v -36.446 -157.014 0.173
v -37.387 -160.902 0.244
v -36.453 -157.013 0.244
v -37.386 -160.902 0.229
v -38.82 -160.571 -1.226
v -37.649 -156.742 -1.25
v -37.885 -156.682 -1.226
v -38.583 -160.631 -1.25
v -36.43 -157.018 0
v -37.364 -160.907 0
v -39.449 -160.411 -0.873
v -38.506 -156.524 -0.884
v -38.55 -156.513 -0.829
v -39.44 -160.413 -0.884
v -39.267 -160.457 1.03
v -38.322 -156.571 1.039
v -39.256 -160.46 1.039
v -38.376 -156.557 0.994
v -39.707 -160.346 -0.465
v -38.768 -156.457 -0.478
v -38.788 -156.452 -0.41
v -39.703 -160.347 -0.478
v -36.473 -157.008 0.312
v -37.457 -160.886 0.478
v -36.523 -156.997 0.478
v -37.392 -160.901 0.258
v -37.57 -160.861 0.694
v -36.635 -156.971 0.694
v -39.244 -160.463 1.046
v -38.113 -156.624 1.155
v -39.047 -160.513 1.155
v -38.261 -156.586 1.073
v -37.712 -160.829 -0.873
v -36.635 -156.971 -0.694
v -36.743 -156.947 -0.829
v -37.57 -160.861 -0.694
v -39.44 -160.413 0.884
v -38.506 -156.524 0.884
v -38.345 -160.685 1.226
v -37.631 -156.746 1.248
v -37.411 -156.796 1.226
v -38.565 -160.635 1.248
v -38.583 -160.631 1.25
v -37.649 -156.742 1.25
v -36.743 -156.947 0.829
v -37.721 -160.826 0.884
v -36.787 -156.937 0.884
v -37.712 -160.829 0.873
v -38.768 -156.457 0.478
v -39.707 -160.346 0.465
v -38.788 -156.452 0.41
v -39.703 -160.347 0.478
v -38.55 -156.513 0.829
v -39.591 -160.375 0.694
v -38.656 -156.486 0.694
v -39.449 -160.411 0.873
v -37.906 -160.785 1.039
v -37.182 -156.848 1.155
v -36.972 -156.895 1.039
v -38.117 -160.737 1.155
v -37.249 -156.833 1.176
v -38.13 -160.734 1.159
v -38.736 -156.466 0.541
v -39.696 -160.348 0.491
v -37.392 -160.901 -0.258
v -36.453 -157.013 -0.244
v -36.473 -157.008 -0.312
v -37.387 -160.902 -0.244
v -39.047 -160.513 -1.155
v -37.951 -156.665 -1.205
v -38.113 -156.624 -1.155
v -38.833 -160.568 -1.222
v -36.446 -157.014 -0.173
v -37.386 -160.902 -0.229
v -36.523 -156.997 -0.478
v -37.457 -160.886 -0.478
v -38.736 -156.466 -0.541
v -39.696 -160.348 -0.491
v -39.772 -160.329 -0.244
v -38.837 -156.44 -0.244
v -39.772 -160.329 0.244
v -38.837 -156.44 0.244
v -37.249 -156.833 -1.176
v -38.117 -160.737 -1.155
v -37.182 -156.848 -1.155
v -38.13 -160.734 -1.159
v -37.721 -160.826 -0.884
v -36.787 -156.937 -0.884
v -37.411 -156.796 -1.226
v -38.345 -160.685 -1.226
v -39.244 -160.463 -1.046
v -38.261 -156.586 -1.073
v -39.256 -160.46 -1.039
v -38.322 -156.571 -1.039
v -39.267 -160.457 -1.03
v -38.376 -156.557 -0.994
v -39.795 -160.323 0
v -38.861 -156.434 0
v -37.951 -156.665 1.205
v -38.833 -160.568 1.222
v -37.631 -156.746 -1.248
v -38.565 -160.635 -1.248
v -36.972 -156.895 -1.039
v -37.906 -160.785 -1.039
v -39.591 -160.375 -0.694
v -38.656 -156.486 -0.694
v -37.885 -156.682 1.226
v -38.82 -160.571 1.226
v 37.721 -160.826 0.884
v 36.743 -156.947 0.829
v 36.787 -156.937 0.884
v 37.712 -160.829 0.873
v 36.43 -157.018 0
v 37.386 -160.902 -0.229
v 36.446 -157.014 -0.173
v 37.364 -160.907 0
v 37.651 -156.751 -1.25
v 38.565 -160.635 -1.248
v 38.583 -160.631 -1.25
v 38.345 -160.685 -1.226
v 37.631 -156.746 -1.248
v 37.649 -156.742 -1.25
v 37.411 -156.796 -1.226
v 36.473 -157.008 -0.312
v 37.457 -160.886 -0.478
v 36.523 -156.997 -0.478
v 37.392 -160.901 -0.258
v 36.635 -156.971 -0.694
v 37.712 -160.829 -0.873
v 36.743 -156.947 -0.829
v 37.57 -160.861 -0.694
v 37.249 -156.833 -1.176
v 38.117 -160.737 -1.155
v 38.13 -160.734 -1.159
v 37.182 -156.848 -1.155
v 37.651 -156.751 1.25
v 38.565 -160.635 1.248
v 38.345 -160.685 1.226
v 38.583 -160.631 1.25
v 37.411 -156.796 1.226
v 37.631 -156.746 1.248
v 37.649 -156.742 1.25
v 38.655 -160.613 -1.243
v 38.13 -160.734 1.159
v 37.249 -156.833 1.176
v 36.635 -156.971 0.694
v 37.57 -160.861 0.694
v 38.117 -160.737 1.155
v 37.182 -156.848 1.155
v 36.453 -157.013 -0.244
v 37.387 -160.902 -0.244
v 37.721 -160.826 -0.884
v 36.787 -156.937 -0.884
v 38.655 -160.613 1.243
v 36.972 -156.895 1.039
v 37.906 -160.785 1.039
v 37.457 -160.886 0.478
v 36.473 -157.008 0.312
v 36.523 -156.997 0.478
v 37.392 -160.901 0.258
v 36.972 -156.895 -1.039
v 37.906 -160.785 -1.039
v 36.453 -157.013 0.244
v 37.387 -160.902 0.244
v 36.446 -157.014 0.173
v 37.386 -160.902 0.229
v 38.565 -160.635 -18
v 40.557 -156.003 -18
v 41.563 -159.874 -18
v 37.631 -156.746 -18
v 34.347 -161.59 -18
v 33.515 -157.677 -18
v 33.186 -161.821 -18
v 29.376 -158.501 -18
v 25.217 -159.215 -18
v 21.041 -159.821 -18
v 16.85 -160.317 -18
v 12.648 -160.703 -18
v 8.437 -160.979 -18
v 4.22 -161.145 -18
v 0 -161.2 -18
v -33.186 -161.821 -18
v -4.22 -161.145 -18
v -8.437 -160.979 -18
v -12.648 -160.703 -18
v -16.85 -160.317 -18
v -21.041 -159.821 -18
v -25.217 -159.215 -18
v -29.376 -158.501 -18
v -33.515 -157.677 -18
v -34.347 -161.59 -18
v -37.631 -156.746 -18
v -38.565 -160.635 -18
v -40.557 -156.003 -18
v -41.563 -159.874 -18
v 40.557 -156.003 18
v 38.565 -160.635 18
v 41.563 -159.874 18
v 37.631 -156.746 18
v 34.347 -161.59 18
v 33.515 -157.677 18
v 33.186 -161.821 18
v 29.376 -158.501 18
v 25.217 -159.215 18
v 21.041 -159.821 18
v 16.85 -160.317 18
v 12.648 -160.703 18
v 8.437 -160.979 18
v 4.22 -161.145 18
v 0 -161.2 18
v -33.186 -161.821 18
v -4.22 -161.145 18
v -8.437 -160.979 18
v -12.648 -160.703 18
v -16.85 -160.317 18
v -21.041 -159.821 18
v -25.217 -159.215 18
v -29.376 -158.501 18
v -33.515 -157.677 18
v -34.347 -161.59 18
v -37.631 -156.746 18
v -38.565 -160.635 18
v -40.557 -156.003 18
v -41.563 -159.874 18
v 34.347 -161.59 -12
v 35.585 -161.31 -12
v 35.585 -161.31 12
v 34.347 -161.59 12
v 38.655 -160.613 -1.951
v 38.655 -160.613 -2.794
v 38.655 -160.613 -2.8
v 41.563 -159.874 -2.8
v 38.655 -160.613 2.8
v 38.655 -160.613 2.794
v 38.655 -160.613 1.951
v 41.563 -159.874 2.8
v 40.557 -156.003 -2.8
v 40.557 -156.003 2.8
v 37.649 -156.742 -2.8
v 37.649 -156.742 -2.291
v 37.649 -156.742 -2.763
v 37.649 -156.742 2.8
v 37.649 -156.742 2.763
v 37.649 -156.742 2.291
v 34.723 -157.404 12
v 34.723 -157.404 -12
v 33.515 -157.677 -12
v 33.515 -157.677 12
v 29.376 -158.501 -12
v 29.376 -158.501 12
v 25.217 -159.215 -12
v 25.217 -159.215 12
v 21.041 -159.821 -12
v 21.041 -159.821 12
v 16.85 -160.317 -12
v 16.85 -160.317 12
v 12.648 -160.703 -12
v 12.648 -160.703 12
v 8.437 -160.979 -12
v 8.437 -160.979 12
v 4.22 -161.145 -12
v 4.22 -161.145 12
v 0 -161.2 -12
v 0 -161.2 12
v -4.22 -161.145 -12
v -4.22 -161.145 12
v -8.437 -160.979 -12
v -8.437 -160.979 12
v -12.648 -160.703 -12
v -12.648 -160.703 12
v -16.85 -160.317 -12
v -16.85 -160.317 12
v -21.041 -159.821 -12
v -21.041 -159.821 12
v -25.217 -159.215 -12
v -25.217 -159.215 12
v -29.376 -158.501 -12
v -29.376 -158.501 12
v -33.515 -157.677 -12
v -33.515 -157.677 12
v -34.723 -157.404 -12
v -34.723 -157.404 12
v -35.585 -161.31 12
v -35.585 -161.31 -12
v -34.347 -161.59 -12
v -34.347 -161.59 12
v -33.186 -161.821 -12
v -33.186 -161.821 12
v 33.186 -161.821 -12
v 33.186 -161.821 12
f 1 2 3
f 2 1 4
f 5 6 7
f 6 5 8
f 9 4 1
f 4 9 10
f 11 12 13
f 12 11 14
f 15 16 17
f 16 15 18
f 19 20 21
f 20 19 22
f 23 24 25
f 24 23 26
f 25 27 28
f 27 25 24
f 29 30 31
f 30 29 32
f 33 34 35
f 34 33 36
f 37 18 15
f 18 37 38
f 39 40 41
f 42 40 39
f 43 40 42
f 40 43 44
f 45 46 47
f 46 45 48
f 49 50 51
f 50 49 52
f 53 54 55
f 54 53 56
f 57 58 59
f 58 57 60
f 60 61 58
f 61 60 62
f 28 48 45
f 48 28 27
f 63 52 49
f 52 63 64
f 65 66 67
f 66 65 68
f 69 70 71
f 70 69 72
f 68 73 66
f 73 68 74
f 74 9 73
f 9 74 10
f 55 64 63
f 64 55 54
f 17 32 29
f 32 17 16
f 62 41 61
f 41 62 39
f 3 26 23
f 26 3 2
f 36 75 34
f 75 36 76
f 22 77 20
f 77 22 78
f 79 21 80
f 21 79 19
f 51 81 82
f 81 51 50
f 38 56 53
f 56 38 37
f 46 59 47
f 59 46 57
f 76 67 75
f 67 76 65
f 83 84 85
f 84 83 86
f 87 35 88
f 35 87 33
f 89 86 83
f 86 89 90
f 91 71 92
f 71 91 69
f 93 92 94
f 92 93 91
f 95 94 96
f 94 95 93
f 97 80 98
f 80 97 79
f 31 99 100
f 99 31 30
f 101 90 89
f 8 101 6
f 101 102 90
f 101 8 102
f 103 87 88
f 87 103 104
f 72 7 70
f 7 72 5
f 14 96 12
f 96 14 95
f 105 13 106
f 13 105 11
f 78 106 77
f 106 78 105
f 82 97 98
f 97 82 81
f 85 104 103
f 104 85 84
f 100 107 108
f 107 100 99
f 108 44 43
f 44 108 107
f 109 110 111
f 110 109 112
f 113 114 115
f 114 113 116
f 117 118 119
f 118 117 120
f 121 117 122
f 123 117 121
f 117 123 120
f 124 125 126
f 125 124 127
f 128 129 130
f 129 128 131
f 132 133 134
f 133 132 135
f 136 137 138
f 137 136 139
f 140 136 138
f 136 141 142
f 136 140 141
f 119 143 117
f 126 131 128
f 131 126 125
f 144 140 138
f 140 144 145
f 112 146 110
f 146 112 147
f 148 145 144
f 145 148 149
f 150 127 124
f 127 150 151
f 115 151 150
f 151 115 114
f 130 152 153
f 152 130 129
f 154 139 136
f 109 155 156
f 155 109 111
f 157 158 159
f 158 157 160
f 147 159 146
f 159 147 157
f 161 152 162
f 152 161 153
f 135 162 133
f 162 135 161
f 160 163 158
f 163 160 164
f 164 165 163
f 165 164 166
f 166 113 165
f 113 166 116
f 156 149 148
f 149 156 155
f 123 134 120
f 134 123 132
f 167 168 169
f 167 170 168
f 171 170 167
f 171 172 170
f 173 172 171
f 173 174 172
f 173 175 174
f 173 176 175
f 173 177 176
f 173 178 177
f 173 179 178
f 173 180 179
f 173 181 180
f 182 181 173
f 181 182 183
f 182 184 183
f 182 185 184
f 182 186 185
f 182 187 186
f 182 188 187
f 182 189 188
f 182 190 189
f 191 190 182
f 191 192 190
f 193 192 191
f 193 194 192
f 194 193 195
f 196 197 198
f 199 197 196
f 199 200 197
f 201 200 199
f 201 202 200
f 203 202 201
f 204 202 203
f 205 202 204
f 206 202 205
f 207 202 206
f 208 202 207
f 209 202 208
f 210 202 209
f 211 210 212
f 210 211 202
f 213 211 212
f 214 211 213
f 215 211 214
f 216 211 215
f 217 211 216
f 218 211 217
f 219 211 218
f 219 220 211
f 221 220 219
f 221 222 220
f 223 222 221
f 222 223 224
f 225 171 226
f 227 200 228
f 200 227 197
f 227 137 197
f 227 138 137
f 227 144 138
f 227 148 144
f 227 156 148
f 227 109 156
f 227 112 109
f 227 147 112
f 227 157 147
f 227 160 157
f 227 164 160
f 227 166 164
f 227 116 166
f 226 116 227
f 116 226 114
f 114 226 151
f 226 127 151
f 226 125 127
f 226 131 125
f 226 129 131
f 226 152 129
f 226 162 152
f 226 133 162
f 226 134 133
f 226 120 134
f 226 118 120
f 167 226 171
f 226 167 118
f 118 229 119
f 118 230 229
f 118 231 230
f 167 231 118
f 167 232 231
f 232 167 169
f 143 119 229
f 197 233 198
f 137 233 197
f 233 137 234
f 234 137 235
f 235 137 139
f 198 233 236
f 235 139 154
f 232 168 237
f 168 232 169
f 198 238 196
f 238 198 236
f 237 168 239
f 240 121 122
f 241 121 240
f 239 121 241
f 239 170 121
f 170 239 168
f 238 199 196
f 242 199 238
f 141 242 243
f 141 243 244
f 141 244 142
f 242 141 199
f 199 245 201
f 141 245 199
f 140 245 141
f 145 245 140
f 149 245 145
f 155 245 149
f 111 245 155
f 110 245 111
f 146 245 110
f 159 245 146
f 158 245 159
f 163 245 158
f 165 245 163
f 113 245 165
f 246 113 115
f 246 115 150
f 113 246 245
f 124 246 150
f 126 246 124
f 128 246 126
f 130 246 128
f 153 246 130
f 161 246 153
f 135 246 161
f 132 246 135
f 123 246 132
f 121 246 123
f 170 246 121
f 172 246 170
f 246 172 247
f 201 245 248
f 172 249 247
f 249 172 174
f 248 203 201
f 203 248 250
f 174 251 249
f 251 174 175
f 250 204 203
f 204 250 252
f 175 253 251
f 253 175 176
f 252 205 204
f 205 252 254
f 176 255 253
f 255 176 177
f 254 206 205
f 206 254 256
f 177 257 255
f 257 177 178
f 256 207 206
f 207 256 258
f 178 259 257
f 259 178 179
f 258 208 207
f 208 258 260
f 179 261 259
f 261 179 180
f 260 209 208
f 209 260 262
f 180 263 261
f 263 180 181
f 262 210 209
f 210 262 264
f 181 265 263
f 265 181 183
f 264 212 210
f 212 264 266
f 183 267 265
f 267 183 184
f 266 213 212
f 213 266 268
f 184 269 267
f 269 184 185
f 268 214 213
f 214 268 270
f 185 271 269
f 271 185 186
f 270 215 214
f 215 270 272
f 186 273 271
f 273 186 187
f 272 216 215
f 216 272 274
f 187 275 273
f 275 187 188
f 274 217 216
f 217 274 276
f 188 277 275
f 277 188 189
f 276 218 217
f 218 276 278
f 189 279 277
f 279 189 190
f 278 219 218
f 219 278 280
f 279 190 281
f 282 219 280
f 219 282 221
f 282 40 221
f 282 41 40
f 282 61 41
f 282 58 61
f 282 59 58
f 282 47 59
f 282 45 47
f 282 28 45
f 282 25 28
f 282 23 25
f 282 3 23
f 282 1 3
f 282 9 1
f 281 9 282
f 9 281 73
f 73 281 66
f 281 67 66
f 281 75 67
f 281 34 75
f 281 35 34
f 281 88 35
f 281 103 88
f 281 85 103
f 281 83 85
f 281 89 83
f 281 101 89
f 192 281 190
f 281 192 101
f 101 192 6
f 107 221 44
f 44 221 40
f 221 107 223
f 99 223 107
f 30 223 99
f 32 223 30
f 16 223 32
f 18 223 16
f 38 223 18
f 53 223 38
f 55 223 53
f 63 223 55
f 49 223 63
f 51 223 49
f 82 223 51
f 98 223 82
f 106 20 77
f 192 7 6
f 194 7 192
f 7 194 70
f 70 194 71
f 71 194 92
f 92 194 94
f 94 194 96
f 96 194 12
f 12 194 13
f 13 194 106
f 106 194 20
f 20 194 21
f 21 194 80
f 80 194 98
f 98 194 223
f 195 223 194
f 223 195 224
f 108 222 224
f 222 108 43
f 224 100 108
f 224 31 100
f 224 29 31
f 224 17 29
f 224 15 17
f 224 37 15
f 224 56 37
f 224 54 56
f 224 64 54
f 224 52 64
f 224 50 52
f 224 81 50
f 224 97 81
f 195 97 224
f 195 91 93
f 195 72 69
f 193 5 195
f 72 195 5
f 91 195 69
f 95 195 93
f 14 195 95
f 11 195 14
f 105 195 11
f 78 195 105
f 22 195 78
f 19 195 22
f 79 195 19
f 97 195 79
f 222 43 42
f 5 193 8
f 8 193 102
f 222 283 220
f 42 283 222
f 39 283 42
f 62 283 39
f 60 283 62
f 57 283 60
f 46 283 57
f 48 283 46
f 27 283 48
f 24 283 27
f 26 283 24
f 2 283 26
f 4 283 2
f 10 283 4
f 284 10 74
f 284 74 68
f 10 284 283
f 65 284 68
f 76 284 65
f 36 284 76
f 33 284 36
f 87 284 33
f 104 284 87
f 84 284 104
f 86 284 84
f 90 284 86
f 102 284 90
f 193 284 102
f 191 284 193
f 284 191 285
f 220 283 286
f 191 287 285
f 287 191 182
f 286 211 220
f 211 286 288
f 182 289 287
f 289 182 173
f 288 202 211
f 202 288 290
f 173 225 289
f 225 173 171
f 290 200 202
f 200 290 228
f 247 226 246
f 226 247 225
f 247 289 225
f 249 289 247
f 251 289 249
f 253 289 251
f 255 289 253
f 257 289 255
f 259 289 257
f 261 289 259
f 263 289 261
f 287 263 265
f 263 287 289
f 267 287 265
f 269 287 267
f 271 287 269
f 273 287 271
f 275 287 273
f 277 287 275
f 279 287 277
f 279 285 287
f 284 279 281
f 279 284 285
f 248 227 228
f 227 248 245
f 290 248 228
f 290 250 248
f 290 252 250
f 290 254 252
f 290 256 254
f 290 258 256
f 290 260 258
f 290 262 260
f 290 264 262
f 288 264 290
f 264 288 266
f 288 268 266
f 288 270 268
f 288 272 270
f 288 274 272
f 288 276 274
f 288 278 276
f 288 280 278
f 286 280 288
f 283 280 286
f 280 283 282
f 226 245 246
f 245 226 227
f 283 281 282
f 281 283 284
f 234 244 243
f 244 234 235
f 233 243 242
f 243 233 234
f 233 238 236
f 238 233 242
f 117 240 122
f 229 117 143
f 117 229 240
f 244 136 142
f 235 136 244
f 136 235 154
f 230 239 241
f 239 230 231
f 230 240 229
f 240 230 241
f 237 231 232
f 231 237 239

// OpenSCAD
// Render target: the lens-side outer shell (lens window frame; doubles as the
// silicone pour mould).
//   openscad -o ../stl/outer_shell.stl outer_shell.scad
include <enclosure.scad>
outer_shell();
